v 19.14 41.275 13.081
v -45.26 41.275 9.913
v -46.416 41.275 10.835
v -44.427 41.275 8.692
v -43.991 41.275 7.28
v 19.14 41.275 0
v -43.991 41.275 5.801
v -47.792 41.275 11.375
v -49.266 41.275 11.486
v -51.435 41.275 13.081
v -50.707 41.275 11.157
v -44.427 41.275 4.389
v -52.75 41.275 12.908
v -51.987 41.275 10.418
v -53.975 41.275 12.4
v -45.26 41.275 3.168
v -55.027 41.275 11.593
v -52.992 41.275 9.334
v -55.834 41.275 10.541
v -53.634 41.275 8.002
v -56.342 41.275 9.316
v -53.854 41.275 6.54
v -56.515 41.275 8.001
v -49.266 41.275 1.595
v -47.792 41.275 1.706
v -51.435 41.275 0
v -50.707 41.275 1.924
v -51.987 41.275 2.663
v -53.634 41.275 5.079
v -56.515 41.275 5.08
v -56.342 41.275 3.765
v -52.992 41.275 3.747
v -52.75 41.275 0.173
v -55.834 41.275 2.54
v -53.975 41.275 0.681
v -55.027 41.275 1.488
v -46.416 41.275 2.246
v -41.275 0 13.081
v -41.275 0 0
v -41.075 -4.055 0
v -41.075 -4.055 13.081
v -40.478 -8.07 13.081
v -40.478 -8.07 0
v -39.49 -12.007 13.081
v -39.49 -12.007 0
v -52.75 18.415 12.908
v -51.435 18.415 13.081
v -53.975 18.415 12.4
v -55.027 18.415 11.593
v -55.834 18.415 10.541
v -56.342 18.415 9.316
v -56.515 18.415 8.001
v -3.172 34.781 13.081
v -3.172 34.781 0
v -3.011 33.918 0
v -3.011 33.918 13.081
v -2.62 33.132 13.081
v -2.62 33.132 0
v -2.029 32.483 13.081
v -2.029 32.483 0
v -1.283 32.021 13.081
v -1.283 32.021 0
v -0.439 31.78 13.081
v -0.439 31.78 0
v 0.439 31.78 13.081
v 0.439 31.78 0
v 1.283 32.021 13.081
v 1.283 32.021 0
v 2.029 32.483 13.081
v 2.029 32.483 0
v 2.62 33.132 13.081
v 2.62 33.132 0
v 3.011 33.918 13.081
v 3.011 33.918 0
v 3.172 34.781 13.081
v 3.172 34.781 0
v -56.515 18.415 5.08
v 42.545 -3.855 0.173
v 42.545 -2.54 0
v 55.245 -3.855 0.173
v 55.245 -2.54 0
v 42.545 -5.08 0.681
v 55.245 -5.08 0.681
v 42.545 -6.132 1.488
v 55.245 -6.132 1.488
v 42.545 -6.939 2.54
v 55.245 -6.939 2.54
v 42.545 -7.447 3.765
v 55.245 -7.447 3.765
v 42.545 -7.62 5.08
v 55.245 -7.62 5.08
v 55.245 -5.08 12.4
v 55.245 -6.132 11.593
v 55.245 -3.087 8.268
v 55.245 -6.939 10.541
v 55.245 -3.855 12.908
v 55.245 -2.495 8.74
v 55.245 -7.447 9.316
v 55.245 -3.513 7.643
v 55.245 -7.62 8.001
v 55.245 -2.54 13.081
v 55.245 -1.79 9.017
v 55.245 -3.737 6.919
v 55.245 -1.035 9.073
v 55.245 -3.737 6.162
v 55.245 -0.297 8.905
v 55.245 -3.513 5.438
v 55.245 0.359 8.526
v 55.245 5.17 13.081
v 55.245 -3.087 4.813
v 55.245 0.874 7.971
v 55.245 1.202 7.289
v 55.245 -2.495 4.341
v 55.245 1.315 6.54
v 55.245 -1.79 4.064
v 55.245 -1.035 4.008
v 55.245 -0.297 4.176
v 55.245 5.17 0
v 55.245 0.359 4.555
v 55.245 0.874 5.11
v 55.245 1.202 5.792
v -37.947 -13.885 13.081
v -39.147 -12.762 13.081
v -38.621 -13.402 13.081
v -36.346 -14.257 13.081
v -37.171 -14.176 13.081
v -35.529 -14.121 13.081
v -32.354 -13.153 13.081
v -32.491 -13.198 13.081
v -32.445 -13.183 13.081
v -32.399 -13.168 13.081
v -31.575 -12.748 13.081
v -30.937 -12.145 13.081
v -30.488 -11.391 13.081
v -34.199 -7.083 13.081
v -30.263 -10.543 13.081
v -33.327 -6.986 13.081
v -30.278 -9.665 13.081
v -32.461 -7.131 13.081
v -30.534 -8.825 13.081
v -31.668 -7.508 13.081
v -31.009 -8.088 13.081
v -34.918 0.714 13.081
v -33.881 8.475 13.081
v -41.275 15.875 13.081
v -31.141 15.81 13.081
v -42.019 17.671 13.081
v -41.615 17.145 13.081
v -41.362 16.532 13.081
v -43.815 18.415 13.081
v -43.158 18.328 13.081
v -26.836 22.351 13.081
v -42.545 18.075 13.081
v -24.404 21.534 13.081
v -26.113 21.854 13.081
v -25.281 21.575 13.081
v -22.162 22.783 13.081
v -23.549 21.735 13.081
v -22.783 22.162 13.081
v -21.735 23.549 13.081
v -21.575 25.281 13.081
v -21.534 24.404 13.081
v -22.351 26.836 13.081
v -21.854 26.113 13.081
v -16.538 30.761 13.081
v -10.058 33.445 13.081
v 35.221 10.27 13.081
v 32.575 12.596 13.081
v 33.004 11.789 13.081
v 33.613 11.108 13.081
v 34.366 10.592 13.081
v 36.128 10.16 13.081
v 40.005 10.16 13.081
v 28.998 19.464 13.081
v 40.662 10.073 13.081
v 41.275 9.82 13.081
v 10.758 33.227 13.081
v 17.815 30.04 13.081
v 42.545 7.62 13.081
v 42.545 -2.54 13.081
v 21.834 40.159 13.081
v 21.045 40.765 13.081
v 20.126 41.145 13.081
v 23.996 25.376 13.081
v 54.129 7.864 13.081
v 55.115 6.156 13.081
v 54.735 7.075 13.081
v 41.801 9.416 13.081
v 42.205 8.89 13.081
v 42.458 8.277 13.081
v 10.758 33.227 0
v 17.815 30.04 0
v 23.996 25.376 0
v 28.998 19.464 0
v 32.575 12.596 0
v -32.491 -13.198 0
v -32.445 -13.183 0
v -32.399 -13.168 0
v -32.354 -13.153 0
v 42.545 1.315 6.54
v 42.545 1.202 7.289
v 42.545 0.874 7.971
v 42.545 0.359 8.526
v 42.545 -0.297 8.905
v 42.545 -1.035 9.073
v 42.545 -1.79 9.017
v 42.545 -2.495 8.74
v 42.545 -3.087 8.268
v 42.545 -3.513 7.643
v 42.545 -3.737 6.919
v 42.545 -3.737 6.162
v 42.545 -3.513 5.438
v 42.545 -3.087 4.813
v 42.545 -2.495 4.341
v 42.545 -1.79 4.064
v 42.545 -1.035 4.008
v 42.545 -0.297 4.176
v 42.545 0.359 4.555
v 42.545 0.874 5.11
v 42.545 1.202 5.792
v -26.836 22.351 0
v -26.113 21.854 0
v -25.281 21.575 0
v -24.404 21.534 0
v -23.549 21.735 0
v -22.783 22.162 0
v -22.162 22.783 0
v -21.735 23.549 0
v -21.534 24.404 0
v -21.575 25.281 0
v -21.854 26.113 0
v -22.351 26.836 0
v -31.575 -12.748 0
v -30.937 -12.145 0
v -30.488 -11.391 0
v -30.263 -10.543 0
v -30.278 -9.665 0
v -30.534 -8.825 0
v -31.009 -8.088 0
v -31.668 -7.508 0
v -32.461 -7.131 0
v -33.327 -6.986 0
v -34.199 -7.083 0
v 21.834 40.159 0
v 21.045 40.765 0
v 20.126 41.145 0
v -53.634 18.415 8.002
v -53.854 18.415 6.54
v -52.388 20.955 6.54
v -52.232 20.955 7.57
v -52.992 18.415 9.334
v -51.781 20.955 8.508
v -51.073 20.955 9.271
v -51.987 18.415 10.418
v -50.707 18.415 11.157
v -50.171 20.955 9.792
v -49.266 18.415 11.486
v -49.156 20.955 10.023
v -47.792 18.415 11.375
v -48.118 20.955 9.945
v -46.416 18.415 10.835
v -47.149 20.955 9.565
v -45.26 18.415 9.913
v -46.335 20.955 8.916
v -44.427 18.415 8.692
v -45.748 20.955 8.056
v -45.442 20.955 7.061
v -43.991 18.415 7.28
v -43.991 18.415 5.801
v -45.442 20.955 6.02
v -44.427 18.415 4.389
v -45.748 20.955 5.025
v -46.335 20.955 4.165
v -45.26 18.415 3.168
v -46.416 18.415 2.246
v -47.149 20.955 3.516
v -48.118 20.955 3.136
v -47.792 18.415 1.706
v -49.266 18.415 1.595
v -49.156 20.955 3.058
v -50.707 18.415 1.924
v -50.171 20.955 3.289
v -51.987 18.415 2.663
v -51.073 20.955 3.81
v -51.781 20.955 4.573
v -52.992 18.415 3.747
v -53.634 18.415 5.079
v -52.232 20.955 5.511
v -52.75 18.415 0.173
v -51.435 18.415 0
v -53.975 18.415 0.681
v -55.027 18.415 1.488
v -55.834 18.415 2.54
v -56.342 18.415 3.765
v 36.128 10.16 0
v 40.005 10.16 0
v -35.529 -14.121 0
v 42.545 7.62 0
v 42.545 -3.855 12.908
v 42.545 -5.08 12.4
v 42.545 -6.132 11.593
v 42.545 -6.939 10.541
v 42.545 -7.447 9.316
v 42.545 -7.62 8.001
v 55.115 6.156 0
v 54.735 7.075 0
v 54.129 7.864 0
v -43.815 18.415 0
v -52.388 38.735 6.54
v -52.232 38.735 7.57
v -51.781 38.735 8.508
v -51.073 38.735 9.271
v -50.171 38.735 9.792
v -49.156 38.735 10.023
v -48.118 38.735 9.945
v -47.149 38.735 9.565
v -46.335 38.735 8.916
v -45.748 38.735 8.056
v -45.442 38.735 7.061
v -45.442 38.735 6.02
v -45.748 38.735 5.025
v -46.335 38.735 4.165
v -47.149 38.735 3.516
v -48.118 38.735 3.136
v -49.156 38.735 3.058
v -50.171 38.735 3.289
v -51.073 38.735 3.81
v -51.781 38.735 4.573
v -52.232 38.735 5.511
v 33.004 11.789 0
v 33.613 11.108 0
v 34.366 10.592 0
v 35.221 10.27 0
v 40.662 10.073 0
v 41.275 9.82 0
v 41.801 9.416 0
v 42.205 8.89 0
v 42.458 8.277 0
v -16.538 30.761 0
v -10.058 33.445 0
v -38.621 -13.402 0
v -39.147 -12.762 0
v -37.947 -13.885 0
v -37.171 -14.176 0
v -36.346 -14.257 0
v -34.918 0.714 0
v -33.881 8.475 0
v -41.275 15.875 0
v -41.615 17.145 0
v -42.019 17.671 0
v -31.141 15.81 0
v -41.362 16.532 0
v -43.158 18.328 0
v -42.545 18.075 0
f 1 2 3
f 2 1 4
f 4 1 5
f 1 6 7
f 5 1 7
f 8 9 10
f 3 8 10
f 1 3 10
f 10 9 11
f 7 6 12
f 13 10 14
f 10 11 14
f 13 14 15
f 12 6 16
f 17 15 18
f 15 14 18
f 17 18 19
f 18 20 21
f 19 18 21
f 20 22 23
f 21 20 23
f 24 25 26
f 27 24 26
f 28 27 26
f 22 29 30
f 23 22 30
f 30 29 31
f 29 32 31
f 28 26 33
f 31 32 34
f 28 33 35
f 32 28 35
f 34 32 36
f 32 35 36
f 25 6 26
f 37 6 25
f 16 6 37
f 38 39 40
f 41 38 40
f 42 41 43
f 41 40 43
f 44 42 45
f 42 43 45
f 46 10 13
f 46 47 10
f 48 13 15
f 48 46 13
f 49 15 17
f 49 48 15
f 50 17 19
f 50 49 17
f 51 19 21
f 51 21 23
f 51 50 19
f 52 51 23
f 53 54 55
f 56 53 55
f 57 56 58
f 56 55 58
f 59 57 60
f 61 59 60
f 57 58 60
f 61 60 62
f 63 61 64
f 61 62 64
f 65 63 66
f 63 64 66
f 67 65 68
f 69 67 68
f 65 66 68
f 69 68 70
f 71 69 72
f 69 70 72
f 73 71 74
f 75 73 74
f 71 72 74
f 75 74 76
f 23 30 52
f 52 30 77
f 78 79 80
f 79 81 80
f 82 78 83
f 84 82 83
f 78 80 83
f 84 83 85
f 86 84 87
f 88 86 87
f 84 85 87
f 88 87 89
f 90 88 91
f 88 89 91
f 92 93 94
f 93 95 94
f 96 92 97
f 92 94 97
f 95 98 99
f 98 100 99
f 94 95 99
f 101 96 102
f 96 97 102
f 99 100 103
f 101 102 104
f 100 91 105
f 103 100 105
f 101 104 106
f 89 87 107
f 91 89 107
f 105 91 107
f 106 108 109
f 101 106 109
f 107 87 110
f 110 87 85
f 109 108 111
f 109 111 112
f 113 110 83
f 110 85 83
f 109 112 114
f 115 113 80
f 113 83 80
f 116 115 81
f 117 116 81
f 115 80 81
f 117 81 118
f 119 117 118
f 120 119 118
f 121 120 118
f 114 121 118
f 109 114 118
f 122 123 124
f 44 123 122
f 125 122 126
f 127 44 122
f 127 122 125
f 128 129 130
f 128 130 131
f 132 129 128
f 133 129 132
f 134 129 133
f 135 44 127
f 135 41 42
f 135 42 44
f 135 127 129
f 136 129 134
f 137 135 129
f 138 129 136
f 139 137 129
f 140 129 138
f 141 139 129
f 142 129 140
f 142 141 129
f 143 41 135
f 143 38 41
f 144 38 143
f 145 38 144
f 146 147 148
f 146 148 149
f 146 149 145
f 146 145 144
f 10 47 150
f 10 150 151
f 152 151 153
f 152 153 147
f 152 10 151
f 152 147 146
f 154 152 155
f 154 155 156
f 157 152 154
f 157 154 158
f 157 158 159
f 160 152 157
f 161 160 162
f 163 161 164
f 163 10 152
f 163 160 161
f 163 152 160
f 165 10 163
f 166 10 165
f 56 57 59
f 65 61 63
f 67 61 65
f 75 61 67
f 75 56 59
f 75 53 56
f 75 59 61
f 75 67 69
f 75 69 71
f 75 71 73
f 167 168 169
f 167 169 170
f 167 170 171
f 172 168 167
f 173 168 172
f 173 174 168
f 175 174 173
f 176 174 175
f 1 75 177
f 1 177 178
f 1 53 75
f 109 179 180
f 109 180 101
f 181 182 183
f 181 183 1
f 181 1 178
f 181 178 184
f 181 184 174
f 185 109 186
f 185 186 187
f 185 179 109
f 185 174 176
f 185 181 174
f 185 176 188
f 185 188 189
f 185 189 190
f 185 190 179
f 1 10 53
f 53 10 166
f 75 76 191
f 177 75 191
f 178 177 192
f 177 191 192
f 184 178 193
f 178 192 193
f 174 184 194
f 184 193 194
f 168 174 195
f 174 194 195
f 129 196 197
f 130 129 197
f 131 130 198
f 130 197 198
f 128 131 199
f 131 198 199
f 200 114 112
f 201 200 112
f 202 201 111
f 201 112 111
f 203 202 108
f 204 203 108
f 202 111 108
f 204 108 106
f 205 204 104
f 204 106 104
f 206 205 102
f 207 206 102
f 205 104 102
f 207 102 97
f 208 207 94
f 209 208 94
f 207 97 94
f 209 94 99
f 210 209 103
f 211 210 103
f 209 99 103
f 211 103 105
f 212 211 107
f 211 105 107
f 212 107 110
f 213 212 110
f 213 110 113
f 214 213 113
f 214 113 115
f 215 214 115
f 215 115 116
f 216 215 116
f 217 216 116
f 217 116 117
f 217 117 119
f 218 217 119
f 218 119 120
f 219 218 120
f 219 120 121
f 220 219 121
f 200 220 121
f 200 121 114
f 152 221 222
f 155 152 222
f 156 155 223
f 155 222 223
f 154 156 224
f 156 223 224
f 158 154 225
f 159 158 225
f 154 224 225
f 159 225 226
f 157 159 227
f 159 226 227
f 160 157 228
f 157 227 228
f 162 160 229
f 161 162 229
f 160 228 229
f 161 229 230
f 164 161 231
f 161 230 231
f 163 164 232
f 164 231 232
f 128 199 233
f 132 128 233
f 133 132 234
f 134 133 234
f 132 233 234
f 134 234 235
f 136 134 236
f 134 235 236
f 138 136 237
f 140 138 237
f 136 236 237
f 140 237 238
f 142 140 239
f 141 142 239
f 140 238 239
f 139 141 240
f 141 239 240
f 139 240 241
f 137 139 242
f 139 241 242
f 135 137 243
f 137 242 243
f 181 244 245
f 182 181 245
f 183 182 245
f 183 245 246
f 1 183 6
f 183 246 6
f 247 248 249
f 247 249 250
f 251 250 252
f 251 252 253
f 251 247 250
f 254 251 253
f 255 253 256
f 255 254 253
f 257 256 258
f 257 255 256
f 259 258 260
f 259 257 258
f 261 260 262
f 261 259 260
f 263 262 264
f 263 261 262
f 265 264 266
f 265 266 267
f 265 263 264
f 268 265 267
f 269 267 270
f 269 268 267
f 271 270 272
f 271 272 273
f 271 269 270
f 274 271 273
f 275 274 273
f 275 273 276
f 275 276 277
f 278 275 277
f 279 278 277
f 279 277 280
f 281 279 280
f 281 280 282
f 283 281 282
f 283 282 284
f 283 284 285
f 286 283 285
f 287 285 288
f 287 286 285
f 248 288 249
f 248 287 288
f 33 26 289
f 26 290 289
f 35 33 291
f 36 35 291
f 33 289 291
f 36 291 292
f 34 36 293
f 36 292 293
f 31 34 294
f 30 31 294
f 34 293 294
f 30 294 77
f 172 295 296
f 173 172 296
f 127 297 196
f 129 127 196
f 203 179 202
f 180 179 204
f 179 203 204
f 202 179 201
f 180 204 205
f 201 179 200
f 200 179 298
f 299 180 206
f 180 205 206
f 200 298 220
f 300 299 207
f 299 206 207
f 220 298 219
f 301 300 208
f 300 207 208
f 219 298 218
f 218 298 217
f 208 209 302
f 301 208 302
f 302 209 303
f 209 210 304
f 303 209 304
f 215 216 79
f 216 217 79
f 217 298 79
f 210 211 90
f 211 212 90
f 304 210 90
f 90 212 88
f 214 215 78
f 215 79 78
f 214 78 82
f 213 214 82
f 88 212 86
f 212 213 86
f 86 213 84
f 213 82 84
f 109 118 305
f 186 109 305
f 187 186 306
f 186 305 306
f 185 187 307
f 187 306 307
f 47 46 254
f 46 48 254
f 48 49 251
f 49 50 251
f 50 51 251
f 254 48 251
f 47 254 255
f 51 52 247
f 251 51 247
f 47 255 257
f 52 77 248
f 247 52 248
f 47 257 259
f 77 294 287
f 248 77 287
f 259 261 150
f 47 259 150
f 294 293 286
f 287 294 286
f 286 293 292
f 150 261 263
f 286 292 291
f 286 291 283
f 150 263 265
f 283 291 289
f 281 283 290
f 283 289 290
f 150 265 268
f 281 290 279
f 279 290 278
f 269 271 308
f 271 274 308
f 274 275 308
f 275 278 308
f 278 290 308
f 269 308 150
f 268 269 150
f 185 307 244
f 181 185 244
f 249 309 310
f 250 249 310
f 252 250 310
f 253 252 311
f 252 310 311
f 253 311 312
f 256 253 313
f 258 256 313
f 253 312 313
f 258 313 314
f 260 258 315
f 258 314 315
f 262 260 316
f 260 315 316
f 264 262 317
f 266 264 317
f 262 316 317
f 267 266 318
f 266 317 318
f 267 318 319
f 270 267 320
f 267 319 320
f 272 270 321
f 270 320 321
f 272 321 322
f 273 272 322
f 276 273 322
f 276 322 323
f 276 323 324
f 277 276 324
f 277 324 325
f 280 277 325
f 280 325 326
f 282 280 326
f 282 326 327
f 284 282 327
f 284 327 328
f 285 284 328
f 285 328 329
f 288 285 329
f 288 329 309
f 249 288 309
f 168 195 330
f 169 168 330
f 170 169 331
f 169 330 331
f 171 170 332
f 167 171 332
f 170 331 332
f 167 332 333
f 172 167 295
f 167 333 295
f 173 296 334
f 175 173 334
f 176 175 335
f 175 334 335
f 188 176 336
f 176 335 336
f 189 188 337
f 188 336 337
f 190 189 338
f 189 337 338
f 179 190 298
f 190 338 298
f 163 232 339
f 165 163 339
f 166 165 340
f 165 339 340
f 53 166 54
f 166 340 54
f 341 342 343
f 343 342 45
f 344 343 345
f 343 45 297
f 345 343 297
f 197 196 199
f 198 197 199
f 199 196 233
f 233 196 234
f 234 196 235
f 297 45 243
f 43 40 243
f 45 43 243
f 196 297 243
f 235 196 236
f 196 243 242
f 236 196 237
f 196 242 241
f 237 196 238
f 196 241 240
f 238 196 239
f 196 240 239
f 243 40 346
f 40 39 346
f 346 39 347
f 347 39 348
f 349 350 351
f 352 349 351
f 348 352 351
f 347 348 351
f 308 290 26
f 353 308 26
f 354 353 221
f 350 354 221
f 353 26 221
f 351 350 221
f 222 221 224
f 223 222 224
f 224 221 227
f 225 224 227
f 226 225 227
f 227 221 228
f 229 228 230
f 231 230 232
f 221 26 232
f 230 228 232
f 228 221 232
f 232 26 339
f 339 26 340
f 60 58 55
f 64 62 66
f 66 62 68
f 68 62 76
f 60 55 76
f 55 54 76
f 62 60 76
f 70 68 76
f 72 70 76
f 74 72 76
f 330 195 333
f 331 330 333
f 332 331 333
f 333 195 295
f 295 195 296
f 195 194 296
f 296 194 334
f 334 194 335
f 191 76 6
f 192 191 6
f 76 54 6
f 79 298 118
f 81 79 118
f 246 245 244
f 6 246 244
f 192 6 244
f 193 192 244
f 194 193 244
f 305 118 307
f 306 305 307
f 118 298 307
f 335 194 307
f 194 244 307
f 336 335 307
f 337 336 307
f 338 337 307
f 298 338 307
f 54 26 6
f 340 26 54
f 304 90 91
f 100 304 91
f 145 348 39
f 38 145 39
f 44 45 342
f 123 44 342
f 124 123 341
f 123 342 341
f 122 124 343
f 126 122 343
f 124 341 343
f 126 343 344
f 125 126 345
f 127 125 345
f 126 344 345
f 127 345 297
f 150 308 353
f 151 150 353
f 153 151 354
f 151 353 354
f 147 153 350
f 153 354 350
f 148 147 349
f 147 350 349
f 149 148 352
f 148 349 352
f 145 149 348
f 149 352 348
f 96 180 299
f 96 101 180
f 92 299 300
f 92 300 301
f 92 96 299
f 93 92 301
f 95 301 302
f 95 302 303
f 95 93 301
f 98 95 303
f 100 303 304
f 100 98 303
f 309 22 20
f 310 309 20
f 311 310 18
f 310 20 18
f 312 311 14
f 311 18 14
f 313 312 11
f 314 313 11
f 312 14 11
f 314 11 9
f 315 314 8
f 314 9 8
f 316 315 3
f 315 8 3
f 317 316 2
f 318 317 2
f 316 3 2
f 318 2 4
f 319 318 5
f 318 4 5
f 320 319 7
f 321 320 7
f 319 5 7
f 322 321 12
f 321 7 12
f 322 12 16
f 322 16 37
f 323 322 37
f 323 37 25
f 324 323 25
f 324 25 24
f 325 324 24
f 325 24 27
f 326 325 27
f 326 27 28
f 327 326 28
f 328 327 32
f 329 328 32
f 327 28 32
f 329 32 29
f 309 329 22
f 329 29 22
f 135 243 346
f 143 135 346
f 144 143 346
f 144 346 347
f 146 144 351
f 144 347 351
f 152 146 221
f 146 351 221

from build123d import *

# Parameters (mm, degrees)
F1_DEPTH = 13.081
F2_R     = 2.54
F3_DEPTH = 25.4
F4_R     = 3.4925
F5_DEPTH = 25.4
F6_SIZE2 = 1.4664696837
F6_SIZE  = 2.54
F7_R     = 5.08


with BuildPart() as f1:
    # F0 (on Top) → F1 (new body)
    with BuildSketch(Plane.XY):
        with BuildLine():
            ThreePointArc((3.1717183454, 34.7806818182), (21.0354315126, 27.8794950829), (32.574512842, 12.5959016393))
            ThreePointArc((32.574512842, 12.5959016393), (33.9739390049, 10.8274361777), (36.1280960611, 10.16))
            Line((36.1280960611, 10.16), (40.005, 10.16))
            ThreePointArc((40.005, 10.16), (41.8010512242, 9.4160512242), (42.545, 7.62))
            Line((42.545, 7.62), (42.545, -7.62))
            Line((42.545, -7.62), (55.245, -7.62))
            Line((55.245, -7.62), (55.245, 5.1702561211))
            ThreePointArc((55.245, 5.1702561211), (54.9549810189, 6.6282799984), (54.1290768363, 7.8643329574))
            Line((54.1290768363, 7.8643329574), (21.8343329574, 40.1590768363))
            ThreePointArc((21.8343329574, 40.1590768363), (20.5982799984, 40.9849810189), (19.1402561211, 41.275))
            Line((19.1402561211, 41.275), (0, 41.275))
            Line((0, 41.275), (-56.515, 41.275))
            Line((-56.515, 41.275), (-56.515, 18.415))
            Line((-56.515, 18.415), (-43.815, 18.415))
            ThreePointArc((-43.815, 18.415), (-42.0189487758, 17.6710512242), (-41.275, 15.875))
            Line((-41.275, 15.875), (-41.275, 0))
            ThreePointArc((-41.275, 0), (-40.8262821798, -6.0696217652), (-39.4898851183, -12.0072727273))
            ThreePointArc((-39.4898851183, -12.0072727273), (-37.9470586927, -13.8847124809), (-35.528565284, -14.1213198343))
            ThreePointArc((-35.528565284, -14.1213198343), (-34.7738270947, -13.7787585984), (-34.1334673575, -13.252529236))
            ThreePointArc((-34.1334673575, -13.252529236), (-33.3596724116, -11.8025855442), (-33.414518177, -10.16))
            ThreePointArc((-33.414518177, -10.16), (-33.8417993799, -8.6306569699), (-34.1991233561, -7.0834727836))
            ThreePointArc((-34.1991233561, -7.0834727836), (-33.8811086179, 8.4750282492), (-26.836399518, 22.3509124179))
            ThreePointArc((-26.836399518, 22.3509124179), (-24.6957043329, 24.6957043329), (-22.3509124179, 26.836399518))
            ThreePointArc((-22.3509124179, 26.836399518), (-13.3652188754, 32.266492673), (-3.1717183454, 34.7806818182))
            ThreePointArc((-3.1717183454, 34.7806818182), (0, 34.925), (3.1717183454, 34.7806818182))
        make_face()
        with BuildLine():
            ThreePointArc((-26.836399518, 22.3509124179), (-22.4506403027, 22.4506403027), (-22.3509124179, 26.836399518))
            ThreePointArc((-22.3509124179, 26.836399518), (-24.6957043329, 24.6957043329), (-26.836399518, 22.3509124179))
        make_face()
        with BuildLine():
            ThreePointArc((-32.3537599551, -13.1525602742), (-30.3768347063, -9.2363636364), (-34.1991233561, -7.0834727836))
            ThreePointArc((-34.1991233561, -7.0834727836), (-33.8417993799, -8.6306569699), (-33.414518177, -10.16))
            ThreePointArc((-33.414518177, -10.16), (-32.9181630162, -11.6683404405), (-32.3537599551, -13.1525602742))
        make_face()
        with BuildLine():
            ThreePointArc((-32.3537599551, -13.1525602742), (-32.9181630162, -11.6683404405), (-33.414518177, -10.16))
            ThreePointArc((-33.414518177, -10.16), (-33.3596724116, -11.8025855442), (-34.1334673575, -13.252529236))
            ThreePointArc((-34.1334673575, -13.252529236), (-33.3085642944, -13.333231598), (-32.4908818133, -13.1976834706))
            ThreePointArc((-32.4908818133, -13.1976834706), (-32.422064403, -13.175901276), (-32.3537599551, -13.1525602742))
        make_face()
        with BuildLine():
            ThreePointArc((-32.4908818133, -13.1976834706), (-33.3085642944, -13.333231598), (-34.1334673575, -13.252529236))
            ThreePointArc((-34.1334673575, -13.252529236), (-34.7738270947, -13.7787585984), (-35.528565284, -14.1213198343))
            Line((-35.528565284, -14.1213198343), (-32.4908818133, -13.1976834706))
        make_face()
        with BuildLine():
            ThreePointArc((-3.1717183454, 34.7806818182), (0, 31.75), (3.1717183454, 34.7806818182))
            ThreePointArc((3.1717183454, 34.7806818182), (0, 34.925), (-3.1717183454, 34.7806818182))
        make_face()
    extrude(amount=F1_DEPTH)

    # F2 (on face) → F3 (cut)
    with BuildSketch(Plane.YZ.offset(55.245)):
        with Locations((-1.2248719395, 6.5405)):
            Circle(F2_R)
    extrude(amount=-F3_DEPTH, mode=Mode.SUBTRACT)

    # F4 (on face) → F5 (cut)
    with BuildSketch(Plane(origin=(0, 41.275, 0), x_dir=(-1, 0, 0), z_dir=(0, 1, 0))):
        with Locations((48.895, 6.5405)):
            Circle(F4_R)
    extrude(amount=-F5_DEPTH, mode=Mode.SUBTRACT)

    # F6
    f6_edges = [f1.edges().sort_by_distance(p)[0] for p in [
        (-45.4025, 41.275, 6.5405),
        (-45.4025, 18.415, 6.5405),
    ]]
    f6_side = f1.faces().sort_by_distance((-45.4025, 29.845, 6.5405))[0]
    chamfer(f6_edges, length=F6_SIZE, length2=F6_SIZE2, reference=f6_side)

    # F7
    f7_edges = [f1.edges().sort_by_distance(p)[0] for p in [
        (-56.515, 29.845, 13.081),
        (-56.515, 29.845, 0),
        (48.895, -7.62, 13.081),
        (48.895, -7.62, 0),
    ]]
    fillet(f7_edges, radius=F7_R)


solid = f1.part
